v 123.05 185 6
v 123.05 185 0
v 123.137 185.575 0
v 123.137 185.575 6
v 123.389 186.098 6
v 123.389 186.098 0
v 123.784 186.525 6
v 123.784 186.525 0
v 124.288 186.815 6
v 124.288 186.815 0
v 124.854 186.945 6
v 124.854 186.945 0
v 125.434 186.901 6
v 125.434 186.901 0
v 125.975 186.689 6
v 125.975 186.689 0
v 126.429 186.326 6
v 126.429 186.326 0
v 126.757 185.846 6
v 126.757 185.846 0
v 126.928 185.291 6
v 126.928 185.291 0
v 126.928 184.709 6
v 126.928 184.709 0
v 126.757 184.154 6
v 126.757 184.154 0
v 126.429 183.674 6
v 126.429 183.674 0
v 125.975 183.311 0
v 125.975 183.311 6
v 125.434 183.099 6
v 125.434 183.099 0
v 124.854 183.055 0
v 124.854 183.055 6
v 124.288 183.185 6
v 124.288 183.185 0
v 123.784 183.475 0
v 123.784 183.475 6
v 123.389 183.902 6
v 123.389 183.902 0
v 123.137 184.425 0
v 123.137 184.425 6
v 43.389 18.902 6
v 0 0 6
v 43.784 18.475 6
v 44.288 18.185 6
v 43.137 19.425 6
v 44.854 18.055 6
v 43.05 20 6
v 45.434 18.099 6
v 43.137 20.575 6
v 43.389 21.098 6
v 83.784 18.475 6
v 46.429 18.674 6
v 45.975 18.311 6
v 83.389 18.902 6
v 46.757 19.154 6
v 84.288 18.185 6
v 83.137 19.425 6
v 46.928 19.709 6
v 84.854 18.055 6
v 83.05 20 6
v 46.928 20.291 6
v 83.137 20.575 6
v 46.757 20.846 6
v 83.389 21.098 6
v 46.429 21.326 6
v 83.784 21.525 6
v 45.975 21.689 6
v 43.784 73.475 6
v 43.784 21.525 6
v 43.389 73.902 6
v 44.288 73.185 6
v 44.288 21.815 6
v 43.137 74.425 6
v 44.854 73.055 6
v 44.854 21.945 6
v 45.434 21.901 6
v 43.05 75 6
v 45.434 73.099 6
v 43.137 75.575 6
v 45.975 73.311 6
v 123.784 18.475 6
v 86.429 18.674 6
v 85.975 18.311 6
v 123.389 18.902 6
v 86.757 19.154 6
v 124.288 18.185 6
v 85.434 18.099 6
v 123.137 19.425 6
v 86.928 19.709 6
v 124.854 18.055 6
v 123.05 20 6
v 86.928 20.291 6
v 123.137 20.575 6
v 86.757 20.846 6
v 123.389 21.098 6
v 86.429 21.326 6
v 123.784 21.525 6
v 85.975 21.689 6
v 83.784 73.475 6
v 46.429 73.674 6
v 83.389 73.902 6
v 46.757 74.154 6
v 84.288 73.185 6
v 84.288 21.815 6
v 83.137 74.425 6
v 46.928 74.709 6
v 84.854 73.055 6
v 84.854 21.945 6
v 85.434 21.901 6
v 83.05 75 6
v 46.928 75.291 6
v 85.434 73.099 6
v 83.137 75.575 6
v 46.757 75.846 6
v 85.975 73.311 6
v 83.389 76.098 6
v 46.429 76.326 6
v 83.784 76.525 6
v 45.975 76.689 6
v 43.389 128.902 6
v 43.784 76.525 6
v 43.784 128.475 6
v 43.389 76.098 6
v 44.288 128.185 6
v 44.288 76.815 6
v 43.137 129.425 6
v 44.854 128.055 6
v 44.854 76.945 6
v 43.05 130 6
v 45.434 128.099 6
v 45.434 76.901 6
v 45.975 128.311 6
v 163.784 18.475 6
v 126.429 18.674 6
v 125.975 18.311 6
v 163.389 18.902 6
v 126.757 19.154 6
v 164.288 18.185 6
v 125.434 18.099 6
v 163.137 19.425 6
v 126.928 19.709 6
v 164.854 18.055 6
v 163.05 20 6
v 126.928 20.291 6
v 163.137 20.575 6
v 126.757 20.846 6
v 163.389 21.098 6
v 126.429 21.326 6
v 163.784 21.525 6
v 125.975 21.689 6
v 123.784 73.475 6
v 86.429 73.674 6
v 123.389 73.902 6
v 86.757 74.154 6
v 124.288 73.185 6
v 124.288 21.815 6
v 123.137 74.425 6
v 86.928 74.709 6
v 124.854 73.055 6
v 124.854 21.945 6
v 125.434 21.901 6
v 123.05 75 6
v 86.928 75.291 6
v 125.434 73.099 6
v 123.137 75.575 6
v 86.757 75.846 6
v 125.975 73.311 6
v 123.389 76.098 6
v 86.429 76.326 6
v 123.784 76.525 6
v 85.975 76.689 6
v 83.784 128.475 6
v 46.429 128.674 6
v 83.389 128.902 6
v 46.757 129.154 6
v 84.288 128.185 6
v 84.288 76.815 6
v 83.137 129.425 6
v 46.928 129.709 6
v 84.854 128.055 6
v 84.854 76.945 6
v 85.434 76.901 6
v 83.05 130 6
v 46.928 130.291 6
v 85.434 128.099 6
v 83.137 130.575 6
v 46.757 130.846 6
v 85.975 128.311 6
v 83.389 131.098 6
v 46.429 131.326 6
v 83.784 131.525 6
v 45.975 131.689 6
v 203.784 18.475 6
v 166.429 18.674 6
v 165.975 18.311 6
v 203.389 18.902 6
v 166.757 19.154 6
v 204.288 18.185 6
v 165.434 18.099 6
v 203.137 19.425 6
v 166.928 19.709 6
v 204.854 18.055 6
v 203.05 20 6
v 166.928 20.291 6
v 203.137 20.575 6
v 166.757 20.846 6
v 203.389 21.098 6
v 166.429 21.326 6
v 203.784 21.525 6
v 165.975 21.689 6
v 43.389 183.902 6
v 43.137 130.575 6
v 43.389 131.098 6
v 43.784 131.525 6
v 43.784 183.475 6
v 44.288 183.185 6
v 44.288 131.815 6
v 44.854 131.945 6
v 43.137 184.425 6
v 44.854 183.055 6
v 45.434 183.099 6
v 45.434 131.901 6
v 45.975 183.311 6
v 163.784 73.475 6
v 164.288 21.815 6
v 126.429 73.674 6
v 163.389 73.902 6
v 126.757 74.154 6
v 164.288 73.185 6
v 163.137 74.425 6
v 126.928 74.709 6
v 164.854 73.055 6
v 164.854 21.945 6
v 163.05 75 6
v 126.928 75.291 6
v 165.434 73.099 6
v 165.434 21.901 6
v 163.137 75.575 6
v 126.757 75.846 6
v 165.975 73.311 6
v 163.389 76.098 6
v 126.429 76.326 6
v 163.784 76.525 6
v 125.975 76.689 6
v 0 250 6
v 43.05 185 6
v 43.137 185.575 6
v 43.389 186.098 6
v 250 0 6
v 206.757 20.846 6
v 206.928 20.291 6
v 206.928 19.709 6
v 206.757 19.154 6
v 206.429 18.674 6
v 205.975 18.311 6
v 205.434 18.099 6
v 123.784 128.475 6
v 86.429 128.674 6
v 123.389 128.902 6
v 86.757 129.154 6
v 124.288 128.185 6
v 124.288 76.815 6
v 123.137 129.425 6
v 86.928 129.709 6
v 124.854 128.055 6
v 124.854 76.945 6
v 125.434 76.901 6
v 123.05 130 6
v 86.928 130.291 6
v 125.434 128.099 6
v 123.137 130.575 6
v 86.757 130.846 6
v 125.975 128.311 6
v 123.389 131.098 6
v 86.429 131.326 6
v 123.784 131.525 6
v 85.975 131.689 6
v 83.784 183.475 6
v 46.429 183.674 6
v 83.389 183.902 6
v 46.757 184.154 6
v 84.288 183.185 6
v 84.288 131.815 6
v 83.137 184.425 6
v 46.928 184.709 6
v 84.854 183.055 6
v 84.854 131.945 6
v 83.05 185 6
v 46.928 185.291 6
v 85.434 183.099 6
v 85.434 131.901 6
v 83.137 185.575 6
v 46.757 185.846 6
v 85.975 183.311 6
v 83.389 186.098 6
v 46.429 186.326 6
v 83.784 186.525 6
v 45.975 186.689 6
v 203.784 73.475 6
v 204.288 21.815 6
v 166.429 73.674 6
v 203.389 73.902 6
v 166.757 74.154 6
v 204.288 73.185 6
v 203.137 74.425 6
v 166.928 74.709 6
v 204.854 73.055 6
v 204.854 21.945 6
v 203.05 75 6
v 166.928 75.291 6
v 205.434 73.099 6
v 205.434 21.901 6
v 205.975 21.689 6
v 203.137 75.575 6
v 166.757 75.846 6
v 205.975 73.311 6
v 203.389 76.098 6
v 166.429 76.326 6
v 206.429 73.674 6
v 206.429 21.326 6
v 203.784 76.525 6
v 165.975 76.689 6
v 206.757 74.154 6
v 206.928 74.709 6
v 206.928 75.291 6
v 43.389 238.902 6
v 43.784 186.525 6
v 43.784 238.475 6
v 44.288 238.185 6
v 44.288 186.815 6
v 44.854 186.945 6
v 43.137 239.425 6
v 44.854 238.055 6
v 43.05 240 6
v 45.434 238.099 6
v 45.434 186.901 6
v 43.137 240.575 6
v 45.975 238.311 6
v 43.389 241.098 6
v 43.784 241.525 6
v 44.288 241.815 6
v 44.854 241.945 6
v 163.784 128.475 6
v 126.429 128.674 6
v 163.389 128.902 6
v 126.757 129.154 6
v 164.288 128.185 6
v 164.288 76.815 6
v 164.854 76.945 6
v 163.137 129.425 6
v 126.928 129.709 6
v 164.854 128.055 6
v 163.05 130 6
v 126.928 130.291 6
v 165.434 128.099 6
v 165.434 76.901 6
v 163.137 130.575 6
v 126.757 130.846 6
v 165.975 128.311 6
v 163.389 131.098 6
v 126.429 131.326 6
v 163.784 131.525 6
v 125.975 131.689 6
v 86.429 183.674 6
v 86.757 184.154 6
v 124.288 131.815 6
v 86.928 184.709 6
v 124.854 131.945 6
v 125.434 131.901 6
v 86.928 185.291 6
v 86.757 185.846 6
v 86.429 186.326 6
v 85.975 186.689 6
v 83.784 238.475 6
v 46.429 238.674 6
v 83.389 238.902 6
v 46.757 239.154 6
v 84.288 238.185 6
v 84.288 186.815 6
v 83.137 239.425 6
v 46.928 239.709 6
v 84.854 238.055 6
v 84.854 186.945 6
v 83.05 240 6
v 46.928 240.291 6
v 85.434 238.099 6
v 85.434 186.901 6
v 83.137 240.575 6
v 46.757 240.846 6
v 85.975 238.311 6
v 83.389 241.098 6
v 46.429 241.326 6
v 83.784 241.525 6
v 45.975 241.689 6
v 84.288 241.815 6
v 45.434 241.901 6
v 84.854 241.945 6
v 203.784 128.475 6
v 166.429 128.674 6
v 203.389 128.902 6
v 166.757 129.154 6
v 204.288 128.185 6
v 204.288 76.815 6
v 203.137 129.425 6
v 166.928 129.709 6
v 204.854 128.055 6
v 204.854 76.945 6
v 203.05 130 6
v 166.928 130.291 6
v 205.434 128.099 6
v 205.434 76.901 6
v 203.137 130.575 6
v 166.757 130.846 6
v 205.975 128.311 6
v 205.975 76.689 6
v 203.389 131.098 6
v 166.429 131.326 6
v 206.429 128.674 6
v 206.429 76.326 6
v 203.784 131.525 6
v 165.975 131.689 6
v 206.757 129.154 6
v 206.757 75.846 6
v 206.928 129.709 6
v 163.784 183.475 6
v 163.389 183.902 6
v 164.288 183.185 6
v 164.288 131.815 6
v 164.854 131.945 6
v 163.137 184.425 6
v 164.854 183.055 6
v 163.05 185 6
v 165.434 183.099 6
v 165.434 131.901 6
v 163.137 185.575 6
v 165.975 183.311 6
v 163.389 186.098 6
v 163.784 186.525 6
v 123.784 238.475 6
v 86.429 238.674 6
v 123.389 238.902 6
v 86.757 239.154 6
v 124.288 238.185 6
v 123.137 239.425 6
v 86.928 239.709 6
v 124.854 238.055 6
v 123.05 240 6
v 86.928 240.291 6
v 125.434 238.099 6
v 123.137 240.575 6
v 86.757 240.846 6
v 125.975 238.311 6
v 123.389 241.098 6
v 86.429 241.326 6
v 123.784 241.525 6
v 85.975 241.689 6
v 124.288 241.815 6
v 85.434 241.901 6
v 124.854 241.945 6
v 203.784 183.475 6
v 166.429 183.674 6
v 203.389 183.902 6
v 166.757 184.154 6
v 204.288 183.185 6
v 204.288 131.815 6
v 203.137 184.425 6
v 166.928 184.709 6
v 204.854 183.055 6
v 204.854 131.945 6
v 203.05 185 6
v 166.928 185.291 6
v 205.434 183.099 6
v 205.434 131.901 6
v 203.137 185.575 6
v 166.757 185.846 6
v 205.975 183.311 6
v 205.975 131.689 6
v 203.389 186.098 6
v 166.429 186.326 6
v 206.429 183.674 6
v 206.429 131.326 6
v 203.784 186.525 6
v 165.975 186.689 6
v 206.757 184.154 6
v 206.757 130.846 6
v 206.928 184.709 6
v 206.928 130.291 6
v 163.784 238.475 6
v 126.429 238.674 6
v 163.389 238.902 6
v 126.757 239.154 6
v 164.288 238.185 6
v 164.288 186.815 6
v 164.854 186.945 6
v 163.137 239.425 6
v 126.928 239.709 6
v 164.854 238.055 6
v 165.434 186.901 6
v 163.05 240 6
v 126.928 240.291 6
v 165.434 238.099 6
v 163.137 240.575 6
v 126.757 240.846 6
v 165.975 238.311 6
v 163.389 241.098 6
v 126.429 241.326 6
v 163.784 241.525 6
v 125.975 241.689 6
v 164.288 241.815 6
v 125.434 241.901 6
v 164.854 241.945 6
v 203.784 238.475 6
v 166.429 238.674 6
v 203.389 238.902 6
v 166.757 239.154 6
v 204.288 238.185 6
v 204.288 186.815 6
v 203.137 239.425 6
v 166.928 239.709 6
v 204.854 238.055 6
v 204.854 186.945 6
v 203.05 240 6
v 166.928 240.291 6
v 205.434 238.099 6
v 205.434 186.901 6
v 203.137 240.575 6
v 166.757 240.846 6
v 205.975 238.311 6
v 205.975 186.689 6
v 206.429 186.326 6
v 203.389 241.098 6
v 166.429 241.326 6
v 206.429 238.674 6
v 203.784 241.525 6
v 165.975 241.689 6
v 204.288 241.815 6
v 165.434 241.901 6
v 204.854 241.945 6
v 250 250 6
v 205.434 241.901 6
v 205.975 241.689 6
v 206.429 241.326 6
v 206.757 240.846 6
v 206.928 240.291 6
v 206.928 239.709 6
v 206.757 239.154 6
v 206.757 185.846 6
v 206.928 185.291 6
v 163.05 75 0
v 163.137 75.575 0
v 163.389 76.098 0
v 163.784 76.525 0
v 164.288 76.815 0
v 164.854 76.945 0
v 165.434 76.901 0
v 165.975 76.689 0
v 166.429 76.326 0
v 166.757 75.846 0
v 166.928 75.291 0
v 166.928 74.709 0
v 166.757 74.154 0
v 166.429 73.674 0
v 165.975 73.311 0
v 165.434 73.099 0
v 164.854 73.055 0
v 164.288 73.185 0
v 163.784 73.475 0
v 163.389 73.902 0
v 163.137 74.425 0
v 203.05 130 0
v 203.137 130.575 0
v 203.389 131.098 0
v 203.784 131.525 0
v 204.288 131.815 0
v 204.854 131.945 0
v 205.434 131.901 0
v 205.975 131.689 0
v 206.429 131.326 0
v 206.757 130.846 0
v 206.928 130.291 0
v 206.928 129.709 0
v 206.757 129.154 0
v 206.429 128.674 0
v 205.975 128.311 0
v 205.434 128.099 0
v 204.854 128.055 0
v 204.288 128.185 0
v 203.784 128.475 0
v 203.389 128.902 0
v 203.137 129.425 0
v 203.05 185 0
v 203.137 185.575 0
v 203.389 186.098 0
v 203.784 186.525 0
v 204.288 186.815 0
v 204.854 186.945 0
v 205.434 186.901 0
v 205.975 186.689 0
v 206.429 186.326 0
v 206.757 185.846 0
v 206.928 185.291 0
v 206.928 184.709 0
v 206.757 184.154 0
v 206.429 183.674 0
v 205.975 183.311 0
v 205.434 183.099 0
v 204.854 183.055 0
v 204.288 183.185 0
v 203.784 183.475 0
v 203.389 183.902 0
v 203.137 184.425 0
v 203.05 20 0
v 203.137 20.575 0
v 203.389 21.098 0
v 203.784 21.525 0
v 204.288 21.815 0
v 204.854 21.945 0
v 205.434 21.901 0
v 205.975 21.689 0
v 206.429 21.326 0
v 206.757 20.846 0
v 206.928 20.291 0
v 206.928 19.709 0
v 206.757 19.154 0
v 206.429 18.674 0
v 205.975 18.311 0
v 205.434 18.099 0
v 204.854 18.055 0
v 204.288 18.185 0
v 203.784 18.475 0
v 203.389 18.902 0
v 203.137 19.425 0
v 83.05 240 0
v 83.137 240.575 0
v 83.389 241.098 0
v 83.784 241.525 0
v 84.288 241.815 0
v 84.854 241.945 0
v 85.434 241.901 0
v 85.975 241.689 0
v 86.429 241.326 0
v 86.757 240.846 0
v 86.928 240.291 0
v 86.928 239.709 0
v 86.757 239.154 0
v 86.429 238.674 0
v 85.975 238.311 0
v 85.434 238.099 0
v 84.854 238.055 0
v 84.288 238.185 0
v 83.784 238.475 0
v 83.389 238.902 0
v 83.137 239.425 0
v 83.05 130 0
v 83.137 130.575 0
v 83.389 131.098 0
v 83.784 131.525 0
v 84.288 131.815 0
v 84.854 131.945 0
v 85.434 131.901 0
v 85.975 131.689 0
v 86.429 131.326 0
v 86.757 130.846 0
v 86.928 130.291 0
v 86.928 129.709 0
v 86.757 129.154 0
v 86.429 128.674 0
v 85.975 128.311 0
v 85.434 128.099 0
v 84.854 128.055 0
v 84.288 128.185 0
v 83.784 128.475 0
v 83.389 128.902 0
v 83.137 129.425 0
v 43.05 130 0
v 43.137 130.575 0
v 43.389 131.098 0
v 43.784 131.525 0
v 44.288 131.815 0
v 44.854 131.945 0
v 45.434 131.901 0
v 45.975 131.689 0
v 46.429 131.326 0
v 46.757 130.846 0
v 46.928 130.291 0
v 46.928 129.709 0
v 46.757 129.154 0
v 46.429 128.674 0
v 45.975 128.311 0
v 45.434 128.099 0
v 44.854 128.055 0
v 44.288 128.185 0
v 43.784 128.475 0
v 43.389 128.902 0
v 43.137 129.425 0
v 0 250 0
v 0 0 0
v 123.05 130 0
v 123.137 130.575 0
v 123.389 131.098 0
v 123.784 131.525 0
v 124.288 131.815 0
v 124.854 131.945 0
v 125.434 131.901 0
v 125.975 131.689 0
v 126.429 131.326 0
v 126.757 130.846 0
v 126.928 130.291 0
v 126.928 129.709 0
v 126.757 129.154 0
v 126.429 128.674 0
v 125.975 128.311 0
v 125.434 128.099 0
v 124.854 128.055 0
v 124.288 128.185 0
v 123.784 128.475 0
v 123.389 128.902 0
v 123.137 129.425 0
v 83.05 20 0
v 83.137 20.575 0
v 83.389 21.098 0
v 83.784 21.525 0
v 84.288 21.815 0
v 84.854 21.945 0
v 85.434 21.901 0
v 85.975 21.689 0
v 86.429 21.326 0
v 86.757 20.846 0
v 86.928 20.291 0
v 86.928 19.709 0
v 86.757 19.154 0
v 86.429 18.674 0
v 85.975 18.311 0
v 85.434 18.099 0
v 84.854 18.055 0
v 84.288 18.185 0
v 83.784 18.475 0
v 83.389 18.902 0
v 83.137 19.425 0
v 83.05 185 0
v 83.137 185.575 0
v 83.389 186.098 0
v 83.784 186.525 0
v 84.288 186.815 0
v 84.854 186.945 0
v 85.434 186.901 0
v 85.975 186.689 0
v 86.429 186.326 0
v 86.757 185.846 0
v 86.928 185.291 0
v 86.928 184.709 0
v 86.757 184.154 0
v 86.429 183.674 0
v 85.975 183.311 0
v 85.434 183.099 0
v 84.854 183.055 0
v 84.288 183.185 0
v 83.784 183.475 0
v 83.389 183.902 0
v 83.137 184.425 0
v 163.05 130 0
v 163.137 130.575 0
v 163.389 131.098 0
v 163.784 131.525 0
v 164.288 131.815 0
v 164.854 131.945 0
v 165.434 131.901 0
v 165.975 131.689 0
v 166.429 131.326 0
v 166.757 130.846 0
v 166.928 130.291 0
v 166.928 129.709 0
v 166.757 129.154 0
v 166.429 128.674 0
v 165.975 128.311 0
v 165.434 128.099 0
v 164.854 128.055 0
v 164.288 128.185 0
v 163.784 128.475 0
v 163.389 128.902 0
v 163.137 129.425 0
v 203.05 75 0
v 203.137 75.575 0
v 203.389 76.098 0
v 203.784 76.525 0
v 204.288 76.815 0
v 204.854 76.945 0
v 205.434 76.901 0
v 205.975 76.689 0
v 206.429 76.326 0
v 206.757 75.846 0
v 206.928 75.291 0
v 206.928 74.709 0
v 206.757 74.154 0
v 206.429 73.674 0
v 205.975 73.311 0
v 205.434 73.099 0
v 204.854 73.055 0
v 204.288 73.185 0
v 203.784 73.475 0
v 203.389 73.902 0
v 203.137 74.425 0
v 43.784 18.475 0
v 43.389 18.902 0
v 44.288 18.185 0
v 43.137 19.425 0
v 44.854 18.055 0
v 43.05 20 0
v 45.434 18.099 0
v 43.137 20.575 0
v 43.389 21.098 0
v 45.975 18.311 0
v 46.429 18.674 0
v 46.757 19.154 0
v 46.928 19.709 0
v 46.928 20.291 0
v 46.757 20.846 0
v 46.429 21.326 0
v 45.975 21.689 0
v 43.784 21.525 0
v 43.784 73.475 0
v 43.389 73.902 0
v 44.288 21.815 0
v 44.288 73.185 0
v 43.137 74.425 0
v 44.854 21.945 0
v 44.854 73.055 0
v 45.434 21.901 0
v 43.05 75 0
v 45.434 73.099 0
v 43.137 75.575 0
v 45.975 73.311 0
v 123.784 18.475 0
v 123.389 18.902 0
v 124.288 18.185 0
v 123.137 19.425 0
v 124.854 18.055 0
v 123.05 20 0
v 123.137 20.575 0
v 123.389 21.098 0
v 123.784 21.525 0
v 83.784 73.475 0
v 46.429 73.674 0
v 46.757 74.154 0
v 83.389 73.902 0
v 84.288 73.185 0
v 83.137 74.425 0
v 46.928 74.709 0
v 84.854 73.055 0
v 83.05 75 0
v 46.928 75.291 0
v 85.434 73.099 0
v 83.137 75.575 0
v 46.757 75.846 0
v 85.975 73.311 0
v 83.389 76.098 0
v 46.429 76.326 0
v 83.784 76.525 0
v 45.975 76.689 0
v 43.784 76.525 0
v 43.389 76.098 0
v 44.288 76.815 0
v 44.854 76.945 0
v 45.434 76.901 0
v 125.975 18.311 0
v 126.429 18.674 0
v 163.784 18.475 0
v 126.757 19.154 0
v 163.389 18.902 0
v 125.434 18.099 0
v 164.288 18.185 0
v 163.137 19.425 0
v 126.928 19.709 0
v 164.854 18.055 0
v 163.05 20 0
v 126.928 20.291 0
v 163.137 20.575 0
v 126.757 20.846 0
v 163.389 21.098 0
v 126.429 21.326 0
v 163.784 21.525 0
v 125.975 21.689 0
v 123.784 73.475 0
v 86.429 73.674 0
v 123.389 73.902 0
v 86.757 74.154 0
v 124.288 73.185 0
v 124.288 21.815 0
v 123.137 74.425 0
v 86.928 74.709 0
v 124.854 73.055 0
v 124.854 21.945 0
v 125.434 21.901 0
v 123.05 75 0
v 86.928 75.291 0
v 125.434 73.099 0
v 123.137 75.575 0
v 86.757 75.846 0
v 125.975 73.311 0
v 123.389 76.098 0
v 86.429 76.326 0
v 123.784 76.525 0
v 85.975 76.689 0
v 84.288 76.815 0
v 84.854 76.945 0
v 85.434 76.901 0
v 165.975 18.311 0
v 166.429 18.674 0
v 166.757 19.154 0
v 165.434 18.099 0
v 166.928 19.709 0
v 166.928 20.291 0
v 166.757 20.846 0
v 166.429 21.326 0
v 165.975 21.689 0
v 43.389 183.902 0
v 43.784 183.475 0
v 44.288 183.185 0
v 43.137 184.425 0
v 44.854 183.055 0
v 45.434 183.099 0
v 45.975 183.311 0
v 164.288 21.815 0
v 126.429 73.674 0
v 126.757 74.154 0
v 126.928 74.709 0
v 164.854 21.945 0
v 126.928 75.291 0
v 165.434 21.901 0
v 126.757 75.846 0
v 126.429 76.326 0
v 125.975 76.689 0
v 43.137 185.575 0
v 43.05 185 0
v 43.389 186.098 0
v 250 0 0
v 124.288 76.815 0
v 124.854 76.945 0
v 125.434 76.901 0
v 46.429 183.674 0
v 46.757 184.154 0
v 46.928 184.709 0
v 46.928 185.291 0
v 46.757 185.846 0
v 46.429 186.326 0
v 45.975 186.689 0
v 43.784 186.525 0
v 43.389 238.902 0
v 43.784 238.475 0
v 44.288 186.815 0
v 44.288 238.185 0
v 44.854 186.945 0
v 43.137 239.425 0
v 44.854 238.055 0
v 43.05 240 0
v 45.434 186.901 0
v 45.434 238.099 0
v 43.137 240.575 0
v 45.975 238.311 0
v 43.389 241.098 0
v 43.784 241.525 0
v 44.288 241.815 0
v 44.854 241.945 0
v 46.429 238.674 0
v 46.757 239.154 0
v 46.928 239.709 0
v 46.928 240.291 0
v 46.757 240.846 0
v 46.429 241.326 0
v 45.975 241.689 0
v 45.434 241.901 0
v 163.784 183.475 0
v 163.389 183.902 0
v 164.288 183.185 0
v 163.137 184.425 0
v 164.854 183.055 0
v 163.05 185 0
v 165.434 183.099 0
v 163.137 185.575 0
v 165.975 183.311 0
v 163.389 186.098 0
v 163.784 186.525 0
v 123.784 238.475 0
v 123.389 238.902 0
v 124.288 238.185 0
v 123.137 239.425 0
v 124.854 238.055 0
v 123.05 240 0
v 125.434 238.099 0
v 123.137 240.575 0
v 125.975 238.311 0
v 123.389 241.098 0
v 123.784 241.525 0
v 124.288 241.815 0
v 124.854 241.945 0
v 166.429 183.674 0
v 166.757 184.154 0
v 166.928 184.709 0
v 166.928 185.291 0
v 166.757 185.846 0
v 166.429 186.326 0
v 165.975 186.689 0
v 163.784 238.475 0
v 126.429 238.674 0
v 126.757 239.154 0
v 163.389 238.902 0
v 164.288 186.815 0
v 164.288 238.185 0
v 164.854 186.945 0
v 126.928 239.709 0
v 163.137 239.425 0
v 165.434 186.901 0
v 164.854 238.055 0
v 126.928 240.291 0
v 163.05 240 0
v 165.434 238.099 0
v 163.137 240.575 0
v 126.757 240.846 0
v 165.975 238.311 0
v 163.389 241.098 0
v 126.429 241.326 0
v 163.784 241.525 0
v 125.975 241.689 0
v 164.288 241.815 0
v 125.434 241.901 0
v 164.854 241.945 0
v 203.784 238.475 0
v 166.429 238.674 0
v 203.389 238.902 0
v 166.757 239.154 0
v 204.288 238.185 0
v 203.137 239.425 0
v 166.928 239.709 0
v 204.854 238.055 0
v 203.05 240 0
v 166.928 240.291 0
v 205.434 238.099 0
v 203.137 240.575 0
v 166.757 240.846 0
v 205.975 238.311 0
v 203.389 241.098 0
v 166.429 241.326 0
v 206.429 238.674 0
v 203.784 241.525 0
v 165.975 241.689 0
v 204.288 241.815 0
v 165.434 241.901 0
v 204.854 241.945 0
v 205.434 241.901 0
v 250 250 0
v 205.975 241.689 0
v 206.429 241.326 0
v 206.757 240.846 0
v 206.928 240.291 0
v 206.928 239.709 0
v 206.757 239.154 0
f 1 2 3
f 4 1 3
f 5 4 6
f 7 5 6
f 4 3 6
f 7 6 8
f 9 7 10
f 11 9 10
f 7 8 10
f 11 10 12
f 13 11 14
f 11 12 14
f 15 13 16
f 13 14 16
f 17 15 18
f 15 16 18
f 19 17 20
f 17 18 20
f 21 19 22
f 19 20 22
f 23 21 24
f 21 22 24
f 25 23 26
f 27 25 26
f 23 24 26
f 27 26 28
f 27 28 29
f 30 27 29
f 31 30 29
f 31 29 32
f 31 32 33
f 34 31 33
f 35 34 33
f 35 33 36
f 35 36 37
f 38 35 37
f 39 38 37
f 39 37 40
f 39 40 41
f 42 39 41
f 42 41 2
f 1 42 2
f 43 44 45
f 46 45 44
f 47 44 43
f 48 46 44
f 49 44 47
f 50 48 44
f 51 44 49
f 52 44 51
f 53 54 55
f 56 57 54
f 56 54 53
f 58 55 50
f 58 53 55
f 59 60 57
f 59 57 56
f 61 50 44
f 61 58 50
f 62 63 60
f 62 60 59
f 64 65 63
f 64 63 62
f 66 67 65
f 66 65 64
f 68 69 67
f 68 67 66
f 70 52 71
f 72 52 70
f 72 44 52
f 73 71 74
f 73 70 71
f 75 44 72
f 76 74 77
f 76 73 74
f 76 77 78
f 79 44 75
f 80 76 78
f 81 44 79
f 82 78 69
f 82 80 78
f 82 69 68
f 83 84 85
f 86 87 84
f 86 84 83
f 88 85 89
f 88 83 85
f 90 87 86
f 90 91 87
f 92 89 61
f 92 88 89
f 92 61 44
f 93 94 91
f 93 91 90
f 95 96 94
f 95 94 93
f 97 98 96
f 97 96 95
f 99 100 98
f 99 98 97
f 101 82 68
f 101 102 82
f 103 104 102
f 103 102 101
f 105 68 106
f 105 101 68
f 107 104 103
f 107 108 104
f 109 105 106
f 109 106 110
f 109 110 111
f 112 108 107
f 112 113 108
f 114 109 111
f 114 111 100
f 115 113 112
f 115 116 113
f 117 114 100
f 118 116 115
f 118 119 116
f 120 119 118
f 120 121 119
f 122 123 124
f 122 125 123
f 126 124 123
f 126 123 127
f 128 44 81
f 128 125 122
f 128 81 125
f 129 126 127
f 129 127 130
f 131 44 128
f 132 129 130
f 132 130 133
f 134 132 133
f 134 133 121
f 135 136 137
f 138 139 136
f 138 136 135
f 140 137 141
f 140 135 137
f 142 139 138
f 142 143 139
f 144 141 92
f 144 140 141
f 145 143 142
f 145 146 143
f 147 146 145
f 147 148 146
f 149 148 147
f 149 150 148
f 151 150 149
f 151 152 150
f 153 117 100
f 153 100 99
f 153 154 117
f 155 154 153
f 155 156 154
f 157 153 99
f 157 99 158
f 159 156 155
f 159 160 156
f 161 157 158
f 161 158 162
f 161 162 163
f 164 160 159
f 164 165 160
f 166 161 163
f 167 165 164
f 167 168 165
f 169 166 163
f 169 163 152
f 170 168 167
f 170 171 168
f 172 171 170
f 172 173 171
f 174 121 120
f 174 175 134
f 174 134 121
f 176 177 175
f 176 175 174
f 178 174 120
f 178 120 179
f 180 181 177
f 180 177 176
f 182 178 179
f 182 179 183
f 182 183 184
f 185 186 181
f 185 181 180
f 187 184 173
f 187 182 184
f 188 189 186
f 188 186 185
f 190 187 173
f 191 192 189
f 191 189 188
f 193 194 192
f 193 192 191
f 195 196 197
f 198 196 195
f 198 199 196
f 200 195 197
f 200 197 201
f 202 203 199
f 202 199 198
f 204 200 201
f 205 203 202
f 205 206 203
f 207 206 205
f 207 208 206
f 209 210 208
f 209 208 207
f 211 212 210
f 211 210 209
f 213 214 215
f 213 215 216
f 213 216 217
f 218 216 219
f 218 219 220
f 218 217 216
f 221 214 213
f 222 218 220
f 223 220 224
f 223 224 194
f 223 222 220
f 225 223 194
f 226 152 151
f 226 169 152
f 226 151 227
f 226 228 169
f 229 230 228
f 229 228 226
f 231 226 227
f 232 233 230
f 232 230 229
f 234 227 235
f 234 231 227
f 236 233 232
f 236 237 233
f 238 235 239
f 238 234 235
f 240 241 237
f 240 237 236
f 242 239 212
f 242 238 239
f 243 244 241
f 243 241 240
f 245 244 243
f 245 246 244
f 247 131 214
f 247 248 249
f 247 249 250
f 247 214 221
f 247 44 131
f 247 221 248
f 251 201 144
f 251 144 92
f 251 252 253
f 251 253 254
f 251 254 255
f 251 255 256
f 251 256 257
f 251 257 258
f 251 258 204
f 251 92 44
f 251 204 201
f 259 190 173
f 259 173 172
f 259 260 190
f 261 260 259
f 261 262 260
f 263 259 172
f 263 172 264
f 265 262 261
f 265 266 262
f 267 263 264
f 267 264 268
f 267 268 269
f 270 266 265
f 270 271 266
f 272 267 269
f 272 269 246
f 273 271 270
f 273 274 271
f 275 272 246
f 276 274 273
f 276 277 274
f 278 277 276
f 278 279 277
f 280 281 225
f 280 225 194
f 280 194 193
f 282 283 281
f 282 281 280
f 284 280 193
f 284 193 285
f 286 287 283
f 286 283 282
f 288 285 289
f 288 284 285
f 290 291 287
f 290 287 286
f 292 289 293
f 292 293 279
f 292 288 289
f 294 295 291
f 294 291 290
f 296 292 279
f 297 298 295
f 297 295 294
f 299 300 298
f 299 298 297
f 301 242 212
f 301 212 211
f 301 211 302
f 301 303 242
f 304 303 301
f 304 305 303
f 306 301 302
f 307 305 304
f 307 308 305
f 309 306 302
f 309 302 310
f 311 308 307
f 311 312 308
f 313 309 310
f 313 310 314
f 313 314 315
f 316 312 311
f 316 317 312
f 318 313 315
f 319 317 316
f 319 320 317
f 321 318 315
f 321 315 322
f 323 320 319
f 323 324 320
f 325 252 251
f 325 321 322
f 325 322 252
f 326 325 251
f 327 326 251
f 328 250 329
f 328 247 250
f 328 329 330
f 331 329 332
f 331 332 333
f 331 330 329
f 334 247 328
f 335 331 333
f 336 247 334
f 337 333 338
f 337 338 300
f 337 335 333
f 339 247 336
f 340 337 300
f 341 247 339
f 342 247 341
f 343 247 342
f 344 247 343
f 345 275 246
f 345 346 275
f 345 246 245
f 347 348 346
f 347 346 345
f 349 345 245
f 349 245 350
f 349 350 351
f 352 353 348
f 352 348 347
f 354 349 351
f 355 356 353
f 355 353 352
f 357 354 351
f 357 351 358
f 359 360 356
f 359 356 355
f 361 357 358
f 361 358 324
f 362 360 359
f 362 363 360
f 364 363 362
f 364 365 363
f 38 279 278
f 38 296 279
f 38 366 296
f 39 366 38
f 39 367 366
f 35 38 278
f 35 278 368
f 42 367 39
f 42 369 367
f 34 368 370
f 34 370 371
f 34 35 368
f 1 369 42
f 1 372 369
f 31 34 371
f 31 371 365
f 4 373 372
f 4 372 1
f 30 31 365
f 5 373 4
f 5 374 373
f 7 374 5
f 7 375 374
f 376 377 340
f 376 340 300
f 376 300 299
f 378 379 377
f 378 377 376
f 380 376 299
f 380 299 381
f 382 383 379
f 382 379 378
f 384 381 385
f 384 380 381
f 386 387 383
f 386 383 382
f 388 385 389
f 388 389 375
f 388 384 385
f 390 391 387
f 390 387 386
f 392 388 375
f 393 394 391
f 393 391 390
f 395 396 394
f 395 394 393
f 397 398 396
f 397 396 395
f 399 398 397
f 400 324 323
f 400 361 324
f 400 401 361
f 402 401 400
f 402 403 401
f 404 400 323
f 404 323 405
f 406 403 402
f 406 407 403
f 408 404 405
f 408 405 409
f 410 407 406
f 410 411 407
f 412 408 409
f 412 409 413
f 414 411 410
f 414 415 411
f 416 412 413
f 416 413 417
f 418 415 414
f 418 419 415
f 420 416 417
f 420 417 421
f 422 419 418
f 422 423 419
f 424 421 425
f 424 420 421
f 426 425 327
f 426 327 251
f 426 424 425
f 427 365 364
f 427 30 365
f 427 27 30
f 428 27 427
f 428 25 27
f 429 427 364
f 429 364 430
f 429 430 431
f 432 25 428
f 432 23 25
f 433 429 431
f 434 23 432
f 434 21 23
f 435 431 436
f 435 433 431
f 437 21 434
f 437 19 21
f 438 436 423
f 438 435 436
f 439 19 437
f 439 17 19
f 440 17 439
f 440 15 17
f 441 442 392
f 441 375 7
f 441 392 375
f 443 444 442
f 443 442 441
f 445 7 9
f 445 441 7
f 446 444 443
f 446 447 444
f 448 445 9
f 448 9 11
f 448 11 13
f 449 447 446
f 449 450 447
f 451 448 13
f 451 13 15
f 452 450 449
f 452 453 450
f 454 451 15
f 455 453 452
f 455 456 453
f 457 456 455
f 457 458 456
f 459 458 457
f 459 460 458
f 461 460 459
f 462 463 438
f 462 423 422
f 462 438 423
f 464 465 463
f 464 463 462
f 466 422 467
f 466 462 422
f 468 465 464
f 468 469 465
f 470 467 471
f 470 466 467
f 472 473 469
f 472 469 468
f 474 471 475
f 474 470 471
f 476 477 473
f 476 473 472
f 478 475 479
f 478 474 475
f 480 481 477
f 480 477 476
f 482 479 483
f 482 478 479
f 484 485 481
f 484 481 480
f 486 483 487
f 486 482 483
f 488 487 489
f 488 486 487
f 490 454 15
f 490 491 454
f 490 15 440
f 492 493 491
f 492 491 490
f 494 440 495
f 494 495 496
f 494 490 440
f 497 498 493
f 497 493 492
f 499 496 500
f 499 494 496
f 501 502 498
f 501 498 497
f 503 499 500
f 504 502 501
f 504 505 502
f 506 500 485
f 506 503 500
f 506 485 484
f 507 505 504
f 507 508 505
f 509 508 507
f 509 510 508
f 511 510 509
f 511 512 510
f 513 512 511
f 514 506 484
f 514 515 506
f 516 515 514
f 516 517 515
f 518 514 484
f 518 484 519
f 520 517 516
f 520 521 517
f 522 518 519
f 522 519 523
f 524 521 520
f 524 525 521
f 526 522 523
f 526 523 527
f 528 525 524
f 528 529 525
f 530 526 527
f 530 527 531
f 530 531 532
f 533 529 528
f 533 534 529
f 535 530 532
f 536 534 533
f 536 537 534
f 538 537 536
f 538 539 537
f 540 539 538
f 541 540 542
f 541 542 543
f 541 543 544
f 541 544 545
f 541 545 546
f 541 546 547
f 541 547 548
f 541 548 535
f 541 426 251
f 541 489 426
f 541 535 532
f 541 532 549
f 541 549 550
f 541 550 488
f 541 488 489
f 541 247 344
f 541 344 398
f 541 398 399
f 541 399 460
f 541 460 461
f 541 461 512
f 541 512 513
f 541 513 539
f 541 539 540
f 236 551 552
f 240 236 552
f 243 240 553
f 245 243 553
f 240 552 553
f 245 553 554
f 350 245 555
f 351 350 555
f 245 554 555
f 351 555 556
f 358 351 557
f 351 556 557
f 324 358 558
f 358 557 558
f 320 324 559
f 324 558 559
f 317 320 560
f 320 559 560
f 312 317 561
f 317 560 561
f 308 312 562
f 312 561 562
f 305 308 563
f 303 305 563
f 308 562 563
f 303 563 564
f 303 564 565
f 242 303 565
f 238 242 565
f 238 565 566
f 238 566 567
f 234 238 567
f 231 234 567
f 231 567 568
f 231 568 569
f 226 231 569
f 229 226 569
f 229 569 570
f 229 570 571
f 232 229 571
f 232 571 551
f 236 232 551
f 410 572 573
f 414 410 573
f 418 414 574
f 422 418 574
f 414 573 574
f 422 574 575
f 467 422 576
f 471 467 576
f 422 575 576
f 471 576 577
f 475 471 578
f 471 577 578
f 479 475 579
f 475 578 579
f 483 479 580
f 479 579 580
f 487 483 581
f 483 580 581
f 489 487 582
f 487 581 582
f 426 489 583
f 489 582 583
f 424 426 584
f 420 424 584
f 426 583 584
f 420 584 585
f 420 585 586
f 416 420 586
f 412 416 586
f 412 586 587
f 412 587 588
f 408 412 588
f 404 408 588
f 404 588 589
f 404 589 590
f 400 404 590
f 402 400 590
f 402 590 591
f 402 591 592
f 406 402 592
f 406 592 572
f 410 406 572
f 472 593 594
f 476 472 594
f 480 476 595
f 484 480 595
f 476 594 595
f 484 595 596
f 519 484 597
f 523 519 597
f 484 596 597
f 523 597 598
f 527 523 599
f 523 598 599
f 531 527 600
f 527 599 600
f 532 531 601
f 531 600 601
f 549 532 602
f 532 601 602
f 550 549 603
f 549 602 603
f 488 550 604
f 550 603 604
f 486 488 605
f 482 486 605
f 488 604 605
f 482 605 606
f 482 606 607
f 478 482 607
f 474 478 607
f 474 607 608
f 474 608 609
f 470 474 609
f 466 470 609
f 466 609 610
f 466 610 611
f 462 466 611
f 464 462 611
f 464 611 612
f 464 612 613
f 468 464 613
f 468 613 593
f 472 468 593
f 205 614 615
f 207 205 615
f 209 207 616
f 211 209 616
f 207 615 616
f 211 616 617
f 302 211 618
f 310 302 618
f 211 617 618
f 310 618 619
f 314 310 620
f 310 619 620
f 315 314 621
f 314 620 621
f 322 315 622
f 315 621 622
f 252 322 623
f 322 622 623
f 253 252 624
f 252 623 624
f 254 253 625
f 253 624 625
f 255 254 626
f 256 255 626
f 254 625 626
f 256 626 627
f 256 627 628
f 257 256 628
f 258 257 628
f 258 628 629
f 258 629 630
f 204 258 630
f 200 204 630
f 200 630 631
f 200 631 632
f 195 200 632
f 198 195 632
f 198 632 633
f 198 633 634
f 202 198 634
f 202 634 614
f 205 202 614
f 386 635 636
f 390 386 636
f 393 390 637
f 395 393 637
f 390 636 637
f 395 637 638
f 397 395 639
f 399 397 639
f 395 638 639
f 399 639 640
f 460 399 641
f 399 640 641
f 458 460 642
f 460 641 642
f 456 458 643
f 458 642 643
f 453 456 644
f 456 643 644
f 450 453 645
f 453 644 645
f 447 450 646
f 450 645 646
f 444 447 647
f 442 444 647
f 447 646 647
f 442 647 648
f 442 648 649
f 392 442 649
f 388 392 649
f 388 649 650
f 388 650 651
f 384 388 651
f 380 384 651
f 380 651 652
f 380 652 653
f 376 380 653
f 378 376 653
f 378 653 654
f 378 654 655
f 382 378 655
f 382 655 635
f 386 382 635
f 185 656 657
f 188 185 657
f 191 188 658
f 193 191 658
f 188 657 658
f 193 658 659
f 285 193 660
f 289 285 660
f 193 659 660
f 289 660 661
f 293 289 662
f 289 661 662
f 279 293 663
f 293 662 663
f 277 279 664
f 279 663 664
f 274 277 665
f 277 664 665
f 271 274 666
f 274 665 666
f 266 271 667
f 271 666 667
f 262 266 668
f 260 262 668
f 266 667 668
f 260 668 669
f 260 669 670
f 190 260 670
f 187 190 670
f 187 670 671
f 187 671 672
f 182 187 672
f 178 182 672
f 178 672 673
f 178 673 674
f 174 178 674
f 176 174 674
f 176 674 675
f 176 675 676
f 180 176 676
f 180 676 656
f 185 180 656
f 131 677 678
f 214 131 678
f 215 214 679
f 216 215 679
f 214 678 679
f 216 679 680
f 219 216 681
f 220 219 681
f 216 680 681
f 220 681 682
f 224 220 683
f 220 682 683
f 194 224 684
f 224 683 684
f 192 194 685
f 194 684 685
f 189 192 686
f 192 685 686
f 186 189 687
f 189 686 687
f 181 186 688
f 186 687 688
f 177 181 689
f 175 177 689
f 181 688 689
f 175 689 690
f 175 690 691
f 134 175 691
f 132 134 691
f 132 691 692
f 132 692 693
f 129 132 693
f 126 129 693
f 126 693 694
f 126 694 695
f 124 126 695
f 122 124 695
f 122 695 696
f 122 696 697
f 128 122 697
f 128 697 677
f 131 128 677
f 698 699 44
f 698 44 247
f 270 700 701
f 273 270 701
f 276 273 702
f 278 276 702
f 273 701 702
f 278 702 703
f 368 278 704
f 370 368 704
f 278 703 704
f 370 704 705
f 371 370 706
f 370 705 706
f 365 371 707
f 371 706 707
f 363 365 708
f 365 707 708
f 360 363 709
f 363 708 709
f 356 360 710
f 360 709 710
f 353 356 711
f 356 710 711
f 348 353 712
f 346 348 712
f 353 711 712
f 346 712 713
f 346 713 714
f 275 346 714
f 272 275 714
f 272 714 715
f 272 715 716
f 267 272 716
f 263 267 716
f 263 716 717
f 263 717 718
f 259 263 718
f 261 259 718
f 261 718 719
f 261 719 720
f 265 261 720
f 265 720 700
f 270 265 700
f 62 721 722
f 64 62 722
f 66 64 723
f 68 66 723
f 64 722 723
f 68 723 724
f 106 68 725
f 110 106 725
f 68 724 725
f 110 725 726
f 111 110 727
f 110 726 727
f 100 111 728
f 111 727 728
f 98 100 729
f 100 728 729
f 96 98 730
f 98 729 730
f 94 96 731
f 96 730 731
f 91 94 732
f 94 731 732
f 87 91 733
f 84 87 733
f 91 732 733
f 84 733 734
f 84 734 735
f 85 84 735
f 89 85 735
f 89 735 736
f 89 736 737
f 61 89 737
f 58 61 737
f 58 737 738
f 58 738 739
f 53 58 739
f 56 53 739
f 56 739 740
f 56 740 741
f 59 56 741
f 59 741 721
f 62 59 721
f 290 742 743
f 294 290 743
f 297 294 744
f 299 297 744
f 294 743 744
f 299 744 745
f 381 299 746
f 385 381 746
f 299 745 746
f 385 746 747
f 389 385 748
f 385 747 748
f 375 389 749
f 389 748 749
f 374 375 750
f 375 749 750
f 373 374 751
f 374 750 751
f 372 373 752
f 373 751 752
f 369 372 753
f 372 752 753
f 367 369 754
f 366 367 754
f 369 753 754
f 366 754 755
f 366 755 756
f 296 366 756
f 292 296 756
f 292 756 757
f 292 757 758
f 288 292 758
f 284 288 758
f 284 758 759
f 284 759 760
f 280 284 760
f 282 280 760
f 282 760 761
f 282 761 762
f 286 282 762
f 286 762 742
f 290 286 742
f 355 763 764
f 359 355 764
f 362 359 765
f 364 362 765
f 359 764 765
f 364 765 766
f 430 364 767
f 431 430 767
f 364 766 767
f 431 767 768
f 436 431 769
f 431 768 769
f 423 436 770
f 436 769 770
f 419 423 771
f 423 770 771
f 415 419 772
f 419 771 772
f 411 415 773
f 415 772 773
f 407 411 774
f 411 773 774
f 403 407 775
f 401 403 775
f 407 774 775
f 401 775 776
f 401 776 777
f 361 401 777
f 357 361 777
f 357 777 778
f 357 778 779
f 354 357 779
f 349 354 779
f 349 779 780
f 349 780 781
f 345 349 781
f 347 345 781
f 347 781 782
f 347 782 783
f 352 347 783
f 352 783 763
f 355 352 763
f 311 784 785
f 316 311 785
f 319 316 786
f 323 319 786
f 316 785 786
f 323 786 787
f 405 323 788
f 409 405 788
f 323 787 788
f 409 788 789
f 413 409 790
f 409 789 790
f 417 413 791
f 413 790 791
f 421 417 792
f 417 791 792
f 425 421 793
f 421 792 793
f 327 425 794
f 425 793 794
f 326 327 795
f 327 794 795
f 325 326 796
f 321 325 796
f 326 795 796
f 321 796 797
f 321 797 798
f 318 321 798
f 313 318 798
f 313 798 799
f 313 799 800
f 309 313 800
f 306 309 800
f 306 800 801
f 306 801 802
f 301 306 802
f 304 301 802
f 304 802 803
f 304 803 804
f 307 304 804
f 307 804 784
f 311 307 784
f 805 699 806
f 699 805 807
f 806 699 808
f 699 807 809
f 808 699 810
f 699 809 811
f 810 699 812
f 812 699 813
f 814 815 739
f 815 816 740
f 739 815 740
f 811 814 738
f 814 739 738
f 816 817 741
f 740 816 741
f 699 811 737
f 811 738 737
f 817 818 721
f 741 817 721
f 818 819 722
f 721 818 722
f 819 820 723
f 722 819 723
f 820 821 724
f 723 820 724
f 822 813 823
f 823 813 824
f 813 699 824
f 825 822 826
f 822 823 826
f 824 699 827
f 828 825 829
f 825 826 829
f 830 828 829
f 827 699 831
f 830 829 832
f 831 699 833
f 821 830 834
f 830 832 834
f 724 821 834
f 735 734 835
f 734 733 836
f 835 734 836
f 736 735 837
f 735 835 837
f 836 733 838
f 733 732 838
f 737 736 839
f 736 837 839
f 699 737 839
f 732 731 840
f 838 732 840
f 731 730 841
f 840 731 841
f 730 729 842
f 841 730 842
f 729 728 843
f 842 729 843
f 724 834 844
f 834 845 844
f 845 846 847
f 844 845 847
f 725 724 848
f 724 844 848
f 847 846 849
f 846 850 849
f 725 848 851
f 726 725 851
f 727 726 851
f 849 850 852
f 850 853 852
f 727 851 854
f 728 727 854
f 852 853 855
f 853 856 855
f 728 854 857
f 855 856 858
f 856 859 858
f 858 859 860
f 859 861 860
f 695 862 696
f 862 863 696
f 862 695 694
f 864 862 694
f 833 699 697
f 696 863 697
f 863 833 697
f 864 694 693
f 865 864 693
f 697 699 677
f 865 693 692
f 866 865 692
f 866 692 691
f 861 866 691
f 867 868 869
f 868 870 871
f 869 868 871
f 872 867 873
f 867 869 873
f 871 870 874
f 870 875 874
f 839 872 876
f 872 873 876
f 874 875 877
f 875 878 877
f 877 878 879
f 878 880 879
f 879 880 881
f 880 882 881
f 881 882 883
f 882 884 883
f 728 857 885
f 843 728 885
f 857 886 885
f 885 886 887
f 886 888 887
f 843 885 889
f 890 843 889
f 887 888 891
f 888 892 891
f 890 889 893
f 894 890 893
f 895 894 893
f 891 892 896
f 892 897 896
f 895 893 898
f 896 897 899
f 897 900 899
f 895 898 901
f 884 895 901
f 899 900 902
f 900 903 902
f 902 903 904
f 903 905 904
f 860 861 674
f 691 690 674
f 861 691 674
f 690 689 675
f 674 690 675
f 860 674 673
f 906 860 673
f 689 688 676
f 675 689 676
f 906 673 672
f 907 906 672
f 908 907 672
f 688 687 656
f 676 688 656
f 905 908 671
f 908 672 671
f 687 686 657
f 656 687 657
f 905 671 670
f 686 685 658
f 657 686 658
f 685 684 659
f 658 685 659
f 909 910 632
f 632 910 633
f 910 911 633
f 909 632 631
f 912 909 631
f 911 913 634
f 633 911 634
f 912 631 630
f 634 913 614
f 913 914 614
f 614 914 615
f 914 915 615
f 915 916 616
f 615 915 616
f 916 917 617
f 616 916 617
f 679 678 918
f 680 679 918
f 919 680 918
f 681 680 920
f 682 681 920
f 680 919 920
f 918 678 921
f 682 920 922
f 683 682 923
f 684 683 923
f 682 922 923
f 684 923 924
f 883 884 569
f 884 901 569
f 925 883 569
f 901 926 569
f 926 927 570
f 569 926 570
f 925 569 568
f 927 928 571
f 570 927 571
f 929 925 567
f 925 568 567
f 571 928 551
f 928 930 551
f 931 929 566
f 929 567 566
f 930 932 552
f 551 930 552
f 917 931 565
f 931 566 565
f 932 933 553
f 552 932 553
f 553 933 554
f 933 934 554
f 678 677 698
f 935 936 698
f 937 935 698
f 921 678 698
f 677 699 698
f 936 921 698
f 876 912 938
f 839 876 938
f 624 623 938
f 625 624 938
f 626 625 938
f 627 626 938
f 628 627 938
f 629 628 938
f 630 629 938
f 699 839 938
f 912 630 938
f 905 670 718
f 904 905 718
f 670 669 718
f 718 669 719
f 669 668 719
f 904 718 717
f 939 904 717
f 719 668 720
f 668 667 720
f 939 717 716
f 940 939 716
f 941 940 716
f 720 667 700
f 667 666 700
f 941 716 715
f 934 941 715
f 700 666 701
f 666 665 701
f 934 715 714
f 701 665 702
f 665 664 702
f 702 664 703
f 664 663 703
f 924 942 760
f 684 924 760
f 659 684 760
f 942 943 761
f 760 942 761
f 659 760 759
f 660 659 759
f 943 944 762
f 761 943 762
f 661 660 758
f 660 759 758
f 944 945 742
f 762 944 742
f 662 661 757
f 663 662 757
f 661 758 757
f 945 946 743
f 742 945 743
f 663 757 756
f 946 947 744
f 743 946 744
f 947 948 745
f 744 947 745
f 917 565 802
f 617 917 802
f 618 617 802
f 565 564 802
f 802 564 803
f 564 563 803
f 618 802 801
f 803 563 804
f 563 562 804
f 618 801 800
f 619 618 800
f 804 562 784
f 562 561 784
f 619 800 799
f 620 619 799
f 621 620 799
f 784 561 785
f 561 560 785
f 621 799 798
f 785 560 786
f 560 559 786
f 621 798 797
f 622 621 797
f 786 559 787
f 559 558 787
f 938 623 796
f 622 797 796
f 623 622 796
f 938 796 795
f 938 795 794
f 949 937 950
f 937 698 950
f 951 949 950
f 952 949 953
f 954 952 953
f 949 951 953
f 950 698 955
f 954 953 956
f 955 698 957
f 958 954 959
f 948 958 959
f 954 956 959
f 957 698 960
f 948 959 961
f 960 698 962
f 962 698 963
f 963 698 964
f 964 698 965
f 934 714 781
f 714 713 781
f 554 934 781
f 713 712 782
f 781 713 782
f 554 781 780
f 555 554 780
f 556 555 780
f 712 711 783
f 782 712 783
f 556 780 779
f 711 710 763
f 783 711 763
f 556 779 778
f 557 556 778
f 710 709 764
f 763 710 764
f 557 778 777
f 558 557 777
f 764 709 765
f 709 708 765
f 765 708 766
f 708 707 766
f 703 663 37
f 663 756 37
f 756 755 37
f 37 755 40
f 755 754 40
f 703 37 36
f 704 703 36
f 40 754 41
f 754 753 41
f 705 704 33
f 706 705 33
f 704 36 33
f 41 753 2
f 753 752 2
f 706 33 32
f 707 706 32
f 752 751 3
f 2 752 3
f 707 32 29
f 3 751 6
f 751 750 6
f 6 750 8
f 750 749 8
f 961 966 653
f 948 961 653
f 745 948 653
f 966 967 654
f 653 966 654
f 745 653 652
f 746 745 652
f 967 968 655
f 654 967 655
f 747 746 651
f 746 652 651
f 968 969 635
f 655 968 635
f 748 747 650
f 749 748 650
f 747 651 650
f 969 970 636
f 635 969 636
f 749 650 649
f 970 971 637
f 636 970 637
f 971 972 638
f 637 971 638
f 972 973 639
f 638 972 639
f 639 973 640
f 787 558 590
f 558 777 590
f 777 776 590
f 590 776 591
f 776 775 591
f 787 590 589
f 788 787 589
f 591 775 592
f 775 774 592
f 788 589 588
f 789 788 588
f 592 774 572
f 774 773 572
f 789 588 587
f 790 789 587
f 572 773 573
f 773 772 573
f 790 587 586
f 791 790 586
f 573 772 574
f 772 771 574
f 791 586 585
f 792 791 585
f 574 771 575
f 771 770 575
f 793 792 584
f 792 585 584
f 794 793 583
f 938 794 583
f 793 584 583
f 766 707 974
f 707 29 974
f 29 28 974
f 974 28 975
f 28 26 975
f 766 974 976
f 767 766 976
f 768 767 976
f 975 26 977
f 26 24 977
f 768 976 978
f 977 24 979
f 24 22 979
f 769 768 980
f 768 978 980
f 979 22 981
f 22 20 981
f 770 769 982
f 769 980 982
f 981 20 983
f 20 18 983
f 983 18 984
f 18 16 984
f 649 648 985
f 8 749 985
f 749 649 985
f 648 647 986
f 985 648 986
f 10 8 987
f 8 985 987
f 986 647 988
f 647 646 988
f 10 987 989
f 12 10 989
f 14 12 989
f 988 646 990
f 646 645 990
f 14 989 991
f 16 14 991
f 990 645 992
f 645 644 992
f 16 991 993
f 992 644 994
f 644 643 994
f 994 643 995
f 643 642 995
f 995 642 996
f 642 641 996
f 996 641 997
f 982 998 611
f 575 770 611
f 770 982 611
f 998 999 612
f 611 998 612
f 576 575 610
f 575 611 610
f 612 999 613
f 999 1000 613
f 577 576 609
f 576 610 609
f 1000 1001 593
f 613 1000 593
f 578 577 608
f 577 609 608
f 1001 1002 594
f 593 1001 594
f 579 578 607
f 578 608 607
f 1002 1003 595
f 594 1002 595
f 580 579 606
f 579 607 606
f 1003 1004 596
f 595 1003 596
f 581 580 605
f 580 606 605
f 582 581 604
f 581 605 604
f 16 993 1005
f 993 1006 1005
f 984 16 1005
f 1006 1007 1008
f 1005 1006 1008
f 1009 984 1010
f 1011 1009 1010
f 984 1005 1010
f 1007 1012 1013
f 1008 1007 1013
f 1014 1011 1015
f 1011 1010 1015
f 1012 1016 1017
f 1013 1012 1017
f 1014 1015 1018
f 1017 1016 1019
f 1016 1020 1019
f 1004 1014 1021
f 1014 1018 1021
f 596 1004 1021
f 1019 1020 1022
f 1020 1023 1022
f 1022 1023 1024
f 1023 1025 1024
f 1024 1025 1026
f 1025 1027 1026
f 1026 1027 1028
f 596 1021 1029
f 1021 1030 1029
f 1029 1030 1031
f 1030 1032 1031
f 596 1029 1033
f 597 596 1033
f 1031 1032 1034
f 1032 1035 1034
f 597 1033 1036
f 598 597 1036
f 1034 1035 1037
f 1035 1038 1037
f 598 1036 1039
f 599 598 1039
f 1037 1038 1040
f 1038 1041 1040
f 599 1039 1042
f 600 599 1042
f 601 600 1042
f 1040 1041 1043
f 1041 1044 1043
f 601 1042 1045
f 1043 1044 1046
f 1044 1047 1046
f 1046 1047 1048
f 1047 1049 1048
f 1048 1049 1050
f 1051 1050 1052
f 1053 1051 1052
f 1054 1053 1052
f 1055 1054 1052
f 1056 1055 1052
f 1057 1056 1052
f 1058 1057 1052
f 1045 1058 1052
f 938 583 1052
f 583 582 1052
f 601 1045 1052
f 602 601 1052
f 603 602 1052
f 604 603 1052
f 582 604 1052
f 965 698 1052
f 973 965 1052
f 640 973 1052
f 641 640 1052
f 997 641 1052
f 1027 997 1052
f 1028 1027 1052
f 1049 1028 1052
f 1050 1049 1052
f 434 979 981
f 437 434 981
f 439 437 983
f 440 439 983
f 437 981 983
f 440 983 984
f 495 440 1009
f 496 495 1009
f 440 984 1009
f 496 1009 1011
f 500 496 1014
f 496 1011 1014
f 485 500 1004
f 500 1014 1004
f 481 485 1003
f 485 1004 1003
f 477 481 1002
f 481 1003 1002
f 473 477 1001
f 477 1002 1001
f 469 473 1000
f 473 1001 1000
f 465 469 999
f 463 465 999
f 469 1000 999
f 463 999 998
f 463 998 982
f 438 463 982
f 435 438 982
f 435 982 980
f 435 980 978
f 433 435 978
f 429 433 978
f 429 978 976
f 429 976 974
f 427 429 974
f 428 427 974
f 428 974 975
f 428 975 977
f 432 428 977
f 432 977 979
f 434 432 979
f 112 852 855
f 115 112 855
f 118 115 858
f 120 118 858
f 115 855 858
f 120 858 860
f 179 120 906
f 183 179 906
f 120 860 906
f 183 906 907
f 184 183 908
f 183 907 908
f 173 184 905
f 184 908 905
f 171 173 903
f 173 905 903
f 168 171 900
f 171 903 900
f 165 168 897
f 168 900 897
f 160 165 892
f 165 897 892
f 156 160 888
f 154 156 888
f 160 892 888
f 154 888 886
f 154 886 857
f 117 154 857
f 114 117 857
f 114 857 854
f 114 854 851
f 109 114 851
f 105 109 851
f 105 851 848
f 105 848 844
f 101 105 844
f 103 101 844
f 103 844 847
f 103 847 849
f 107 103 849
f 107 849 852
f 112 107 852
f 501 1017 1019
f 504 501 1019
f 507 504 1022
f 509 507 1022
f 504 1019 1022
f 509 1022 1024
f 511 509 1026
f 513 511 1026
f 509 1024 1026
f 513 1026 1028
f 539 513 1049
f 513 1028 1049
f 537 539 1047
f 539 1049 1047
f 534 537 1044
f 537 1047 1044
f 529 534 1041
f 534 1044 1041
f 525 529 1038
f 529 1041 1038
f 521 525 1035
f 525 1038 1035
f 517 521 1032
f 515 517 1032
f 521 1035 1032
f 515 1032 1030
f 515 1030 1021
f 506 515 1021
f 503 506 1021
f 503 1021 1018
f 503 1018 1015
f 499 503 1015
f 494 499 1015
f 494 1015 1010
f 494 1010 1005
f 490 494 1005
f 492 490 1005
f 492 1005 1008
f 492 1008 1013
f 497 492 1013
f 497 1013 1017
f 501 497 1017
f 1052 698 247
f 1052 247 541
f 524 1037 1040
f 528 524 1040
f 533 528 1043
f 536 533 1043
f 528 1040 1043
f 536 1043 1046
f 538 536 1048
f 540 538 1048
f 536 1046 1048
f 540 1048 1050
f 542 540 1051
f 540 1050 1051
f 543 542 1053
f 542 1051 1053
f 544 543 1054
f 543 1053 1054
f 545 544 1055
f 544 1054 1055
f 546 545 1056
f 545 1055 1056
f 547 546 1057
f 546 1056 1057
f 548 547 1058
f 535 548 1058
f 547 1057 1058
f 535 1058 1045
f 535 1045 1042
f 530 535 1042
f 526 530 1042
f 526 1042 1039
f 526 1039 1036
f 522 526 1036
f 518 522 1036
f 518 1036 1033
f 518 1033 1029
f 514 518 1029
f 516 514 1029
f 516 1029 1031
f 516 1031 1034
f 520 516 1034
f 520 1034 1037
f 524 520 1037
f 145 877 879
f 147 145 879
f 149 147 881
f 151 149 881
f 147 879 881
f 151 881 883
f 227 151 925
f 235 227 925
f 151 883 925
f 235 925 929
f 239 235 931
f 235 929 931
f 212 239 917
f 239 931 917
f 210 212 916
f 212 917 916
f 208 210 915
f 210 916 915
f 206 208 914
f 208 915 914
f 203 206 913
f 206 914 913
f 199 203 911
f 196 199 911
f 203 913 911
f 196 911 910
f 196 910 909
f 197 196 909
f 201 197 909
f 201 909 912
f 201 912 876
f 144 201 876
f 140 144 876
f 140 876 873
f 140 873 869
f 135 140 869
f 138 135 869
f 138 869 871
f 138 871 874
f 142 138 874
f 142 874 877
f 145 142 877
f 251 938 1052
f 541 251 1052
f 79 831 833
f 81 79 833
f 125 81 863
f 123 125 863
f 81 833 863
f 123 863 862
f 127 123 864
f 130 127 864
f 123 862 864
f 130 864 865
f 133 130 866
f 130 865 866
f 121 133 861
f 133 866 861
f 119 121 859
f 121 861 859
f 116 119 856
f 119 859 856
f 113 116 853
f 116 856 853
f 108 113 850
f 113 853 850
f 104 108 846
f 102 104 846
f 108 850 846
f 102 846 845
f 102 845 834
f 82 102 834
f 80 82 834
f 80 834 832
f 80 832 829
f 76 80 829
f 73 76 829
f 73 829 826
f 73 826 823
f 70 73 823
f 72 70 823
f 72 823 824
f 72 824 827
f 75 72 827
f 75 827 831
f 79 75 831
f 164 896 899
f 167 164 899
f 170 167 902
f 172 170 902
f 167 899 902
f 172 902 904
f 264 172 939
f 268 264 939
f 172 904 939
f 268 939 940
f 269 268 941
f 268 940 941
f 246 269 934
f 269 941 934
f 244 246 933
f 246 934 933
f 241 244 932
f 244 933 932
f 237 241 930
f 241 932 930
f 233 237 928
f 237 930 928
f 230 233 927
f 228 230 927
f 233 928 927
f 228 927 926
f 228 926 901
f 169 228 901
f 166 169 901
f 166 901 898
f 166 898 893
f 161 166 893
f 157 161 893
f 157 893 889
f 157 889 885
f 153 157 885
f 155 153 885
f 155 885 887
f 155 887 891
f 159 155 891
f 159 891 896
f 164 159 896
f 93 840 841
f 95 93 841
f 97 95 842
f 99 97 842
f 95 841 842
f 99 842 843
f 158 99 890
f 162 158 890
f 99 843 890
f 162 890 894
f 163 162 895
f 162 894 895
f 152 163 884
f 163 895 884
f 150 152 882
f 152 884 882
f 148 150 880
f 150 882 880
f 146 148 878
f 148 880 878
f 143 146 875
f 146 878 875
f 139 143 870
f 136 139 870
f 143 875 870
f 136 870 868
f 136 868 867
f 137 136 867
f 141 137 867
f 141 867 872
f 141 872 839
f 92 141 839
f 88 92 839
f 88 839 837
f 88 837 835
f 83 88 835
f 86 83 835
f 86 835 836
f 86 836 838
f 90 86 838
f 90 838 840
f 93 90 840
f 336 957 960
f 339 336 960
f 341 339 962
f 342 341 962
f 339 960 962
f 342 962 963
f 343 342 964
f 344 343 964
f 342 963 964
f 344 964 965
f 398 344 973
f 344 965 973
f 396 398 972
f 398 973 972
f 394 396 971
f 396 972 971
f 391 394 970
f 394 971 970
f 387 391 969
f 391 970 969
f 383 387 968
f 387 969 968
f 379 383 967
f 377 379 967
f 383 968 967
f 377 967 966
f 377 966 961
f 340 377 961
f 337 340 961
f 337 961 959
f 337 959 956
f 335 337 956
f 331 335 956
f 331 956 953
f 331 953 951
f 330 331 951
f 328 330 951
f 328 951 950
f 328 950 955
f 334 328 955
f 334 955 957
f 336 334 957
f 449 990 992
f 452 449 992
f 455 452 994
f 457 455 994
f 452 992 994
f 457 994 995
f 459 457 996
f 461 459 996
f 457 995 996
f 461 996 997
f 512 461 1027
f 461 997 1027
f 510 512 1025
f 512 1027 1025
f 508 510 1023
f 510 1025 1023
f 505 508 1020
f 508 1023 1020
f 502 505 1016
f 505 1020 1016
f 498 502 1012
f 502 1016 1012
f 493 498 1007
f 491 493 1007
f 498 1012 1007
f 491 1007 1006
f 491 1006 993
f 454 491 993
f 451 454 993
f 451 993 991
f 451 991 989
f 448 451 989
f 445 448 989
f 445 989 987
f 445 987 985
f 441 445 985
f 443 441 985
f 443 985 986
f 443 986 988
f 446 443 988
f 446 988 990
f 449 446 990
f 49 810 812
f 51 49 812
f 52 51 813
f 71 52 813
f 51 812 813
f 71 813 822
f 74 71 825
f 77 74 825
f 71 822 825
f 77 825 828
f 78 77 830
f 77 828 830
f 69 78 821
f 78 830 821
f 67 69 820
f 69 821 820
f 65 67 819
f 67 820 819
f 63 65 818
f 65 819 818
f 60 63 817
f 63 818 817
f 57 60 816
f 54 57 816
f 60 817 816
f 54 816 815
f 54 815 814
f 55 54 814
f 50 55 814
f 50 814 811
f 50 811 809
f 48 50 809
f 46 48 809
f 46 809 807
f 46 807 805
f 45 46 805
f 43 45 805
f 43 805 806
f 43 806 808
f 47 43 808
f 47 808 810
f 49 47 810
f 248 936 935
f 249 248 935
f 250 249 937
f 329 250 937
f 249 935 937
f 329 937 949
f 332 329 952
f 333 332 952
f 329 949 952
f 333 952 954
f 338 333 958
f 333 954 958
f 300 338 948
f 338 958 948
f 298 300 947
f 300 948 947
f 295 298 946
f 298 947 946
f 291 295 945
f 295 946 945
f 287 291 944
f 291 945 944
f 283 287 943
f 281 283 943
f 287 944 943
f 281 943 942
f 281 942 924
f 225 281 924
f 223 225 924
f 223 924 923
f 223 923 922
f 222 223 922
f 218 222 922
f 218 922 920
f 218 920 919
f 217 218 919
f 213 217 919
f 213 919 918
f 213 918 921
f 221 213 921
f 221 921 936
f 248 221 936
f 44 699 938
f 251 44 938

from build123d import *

# Parameters (mm, degrees)
ESQUISSE1_W                       = 250
ESQUISSE1_H                       = 250
BOSS_EXTRU_1_DEPTH                = 6
DIAM_TRE_DU_PER_AGE_0_15_0_15_1_D = 3.9
R_P_TITION_LIN_AIRE1_COUNT        = 4
R_P_TITION_LIN_AIRE1_PITCH        = 40
R_P_TITION_LIN_AIRE1_COUNT_DIR2   = 5
R_P_TITION_LIN_AIRE1_PITCH_DIR2   = 55
R_P_TITION_LIN_AIRE2_COUNT        = 2
R_P_TITION_LIN_AIRE2_PITCH        = 40
R_P_TITION_LIN_AIRE2_COUNT_DIR2   = 5
R_P_TITION_LIN_AIRE2_PITCH_DIR2   = 55


with BuildPart() as part:
    # Esquisse1 → Boss.-Extru.1 (new body)
    with BuildSketch(Plane.XY):
        with Locations((125, 125)):
            Rectangle(ESQUISSE1_W, ESQUISSE1_H)
    extrude(amount=BOSS_EXTRU_1_DEPTH)

    # Diamètre du perçage Ø0.15 (0.15)1 (through all)
    with Locations(Plane.XY.offset(6)):
        with Locations((85, 20)):
            diam_tre_du_per_age_0_15_0_15_1 = Hole(DIAM_TRE_DU_PER_AGE_0_15_0_15_1_D / 2)

    # Répétition linéaire1: Diam_tre du per_age _0.15 _0.15_1 4 × 5
    with Locations(*[(i * R_P_TITION_LIN_AIRE1_PITCH, j * R_P_TITION_LIN_AIRE1_PITCH_DIR2, 0) for i in range(R_P_TITION_LIN_AIRE1_COUNT) for j in range(R_P_TITION_LIN_AIRE1_COUNT_DIR2) if (i, j) != (0, 0)]):
        add(diam_tre_du_per_age_0_15_0_15_1, mode=Mode.SUBTRACT)

    # Répétition linéaire2: Diam_tre du per_age _0.15 _0.15_1 2 × 5
    with Locations(*[(-i * R_P_TITION_LIN_AIRE2_PITCH, j * R_P_TITION_LIN_AIRE2_PITCH_DIR2, 0) for i in range(R_P_TITION_LIN_AIRE2_COUNT) for j in range(R_P_TITION_LIN_AIRE2_COUNT_DIR2) if (i, j) != (0, 0)]):
        add(diam_tre_du_per_age_0_15_0_15_1, mode=Mode.SUBTRACT)


solid = part.part
